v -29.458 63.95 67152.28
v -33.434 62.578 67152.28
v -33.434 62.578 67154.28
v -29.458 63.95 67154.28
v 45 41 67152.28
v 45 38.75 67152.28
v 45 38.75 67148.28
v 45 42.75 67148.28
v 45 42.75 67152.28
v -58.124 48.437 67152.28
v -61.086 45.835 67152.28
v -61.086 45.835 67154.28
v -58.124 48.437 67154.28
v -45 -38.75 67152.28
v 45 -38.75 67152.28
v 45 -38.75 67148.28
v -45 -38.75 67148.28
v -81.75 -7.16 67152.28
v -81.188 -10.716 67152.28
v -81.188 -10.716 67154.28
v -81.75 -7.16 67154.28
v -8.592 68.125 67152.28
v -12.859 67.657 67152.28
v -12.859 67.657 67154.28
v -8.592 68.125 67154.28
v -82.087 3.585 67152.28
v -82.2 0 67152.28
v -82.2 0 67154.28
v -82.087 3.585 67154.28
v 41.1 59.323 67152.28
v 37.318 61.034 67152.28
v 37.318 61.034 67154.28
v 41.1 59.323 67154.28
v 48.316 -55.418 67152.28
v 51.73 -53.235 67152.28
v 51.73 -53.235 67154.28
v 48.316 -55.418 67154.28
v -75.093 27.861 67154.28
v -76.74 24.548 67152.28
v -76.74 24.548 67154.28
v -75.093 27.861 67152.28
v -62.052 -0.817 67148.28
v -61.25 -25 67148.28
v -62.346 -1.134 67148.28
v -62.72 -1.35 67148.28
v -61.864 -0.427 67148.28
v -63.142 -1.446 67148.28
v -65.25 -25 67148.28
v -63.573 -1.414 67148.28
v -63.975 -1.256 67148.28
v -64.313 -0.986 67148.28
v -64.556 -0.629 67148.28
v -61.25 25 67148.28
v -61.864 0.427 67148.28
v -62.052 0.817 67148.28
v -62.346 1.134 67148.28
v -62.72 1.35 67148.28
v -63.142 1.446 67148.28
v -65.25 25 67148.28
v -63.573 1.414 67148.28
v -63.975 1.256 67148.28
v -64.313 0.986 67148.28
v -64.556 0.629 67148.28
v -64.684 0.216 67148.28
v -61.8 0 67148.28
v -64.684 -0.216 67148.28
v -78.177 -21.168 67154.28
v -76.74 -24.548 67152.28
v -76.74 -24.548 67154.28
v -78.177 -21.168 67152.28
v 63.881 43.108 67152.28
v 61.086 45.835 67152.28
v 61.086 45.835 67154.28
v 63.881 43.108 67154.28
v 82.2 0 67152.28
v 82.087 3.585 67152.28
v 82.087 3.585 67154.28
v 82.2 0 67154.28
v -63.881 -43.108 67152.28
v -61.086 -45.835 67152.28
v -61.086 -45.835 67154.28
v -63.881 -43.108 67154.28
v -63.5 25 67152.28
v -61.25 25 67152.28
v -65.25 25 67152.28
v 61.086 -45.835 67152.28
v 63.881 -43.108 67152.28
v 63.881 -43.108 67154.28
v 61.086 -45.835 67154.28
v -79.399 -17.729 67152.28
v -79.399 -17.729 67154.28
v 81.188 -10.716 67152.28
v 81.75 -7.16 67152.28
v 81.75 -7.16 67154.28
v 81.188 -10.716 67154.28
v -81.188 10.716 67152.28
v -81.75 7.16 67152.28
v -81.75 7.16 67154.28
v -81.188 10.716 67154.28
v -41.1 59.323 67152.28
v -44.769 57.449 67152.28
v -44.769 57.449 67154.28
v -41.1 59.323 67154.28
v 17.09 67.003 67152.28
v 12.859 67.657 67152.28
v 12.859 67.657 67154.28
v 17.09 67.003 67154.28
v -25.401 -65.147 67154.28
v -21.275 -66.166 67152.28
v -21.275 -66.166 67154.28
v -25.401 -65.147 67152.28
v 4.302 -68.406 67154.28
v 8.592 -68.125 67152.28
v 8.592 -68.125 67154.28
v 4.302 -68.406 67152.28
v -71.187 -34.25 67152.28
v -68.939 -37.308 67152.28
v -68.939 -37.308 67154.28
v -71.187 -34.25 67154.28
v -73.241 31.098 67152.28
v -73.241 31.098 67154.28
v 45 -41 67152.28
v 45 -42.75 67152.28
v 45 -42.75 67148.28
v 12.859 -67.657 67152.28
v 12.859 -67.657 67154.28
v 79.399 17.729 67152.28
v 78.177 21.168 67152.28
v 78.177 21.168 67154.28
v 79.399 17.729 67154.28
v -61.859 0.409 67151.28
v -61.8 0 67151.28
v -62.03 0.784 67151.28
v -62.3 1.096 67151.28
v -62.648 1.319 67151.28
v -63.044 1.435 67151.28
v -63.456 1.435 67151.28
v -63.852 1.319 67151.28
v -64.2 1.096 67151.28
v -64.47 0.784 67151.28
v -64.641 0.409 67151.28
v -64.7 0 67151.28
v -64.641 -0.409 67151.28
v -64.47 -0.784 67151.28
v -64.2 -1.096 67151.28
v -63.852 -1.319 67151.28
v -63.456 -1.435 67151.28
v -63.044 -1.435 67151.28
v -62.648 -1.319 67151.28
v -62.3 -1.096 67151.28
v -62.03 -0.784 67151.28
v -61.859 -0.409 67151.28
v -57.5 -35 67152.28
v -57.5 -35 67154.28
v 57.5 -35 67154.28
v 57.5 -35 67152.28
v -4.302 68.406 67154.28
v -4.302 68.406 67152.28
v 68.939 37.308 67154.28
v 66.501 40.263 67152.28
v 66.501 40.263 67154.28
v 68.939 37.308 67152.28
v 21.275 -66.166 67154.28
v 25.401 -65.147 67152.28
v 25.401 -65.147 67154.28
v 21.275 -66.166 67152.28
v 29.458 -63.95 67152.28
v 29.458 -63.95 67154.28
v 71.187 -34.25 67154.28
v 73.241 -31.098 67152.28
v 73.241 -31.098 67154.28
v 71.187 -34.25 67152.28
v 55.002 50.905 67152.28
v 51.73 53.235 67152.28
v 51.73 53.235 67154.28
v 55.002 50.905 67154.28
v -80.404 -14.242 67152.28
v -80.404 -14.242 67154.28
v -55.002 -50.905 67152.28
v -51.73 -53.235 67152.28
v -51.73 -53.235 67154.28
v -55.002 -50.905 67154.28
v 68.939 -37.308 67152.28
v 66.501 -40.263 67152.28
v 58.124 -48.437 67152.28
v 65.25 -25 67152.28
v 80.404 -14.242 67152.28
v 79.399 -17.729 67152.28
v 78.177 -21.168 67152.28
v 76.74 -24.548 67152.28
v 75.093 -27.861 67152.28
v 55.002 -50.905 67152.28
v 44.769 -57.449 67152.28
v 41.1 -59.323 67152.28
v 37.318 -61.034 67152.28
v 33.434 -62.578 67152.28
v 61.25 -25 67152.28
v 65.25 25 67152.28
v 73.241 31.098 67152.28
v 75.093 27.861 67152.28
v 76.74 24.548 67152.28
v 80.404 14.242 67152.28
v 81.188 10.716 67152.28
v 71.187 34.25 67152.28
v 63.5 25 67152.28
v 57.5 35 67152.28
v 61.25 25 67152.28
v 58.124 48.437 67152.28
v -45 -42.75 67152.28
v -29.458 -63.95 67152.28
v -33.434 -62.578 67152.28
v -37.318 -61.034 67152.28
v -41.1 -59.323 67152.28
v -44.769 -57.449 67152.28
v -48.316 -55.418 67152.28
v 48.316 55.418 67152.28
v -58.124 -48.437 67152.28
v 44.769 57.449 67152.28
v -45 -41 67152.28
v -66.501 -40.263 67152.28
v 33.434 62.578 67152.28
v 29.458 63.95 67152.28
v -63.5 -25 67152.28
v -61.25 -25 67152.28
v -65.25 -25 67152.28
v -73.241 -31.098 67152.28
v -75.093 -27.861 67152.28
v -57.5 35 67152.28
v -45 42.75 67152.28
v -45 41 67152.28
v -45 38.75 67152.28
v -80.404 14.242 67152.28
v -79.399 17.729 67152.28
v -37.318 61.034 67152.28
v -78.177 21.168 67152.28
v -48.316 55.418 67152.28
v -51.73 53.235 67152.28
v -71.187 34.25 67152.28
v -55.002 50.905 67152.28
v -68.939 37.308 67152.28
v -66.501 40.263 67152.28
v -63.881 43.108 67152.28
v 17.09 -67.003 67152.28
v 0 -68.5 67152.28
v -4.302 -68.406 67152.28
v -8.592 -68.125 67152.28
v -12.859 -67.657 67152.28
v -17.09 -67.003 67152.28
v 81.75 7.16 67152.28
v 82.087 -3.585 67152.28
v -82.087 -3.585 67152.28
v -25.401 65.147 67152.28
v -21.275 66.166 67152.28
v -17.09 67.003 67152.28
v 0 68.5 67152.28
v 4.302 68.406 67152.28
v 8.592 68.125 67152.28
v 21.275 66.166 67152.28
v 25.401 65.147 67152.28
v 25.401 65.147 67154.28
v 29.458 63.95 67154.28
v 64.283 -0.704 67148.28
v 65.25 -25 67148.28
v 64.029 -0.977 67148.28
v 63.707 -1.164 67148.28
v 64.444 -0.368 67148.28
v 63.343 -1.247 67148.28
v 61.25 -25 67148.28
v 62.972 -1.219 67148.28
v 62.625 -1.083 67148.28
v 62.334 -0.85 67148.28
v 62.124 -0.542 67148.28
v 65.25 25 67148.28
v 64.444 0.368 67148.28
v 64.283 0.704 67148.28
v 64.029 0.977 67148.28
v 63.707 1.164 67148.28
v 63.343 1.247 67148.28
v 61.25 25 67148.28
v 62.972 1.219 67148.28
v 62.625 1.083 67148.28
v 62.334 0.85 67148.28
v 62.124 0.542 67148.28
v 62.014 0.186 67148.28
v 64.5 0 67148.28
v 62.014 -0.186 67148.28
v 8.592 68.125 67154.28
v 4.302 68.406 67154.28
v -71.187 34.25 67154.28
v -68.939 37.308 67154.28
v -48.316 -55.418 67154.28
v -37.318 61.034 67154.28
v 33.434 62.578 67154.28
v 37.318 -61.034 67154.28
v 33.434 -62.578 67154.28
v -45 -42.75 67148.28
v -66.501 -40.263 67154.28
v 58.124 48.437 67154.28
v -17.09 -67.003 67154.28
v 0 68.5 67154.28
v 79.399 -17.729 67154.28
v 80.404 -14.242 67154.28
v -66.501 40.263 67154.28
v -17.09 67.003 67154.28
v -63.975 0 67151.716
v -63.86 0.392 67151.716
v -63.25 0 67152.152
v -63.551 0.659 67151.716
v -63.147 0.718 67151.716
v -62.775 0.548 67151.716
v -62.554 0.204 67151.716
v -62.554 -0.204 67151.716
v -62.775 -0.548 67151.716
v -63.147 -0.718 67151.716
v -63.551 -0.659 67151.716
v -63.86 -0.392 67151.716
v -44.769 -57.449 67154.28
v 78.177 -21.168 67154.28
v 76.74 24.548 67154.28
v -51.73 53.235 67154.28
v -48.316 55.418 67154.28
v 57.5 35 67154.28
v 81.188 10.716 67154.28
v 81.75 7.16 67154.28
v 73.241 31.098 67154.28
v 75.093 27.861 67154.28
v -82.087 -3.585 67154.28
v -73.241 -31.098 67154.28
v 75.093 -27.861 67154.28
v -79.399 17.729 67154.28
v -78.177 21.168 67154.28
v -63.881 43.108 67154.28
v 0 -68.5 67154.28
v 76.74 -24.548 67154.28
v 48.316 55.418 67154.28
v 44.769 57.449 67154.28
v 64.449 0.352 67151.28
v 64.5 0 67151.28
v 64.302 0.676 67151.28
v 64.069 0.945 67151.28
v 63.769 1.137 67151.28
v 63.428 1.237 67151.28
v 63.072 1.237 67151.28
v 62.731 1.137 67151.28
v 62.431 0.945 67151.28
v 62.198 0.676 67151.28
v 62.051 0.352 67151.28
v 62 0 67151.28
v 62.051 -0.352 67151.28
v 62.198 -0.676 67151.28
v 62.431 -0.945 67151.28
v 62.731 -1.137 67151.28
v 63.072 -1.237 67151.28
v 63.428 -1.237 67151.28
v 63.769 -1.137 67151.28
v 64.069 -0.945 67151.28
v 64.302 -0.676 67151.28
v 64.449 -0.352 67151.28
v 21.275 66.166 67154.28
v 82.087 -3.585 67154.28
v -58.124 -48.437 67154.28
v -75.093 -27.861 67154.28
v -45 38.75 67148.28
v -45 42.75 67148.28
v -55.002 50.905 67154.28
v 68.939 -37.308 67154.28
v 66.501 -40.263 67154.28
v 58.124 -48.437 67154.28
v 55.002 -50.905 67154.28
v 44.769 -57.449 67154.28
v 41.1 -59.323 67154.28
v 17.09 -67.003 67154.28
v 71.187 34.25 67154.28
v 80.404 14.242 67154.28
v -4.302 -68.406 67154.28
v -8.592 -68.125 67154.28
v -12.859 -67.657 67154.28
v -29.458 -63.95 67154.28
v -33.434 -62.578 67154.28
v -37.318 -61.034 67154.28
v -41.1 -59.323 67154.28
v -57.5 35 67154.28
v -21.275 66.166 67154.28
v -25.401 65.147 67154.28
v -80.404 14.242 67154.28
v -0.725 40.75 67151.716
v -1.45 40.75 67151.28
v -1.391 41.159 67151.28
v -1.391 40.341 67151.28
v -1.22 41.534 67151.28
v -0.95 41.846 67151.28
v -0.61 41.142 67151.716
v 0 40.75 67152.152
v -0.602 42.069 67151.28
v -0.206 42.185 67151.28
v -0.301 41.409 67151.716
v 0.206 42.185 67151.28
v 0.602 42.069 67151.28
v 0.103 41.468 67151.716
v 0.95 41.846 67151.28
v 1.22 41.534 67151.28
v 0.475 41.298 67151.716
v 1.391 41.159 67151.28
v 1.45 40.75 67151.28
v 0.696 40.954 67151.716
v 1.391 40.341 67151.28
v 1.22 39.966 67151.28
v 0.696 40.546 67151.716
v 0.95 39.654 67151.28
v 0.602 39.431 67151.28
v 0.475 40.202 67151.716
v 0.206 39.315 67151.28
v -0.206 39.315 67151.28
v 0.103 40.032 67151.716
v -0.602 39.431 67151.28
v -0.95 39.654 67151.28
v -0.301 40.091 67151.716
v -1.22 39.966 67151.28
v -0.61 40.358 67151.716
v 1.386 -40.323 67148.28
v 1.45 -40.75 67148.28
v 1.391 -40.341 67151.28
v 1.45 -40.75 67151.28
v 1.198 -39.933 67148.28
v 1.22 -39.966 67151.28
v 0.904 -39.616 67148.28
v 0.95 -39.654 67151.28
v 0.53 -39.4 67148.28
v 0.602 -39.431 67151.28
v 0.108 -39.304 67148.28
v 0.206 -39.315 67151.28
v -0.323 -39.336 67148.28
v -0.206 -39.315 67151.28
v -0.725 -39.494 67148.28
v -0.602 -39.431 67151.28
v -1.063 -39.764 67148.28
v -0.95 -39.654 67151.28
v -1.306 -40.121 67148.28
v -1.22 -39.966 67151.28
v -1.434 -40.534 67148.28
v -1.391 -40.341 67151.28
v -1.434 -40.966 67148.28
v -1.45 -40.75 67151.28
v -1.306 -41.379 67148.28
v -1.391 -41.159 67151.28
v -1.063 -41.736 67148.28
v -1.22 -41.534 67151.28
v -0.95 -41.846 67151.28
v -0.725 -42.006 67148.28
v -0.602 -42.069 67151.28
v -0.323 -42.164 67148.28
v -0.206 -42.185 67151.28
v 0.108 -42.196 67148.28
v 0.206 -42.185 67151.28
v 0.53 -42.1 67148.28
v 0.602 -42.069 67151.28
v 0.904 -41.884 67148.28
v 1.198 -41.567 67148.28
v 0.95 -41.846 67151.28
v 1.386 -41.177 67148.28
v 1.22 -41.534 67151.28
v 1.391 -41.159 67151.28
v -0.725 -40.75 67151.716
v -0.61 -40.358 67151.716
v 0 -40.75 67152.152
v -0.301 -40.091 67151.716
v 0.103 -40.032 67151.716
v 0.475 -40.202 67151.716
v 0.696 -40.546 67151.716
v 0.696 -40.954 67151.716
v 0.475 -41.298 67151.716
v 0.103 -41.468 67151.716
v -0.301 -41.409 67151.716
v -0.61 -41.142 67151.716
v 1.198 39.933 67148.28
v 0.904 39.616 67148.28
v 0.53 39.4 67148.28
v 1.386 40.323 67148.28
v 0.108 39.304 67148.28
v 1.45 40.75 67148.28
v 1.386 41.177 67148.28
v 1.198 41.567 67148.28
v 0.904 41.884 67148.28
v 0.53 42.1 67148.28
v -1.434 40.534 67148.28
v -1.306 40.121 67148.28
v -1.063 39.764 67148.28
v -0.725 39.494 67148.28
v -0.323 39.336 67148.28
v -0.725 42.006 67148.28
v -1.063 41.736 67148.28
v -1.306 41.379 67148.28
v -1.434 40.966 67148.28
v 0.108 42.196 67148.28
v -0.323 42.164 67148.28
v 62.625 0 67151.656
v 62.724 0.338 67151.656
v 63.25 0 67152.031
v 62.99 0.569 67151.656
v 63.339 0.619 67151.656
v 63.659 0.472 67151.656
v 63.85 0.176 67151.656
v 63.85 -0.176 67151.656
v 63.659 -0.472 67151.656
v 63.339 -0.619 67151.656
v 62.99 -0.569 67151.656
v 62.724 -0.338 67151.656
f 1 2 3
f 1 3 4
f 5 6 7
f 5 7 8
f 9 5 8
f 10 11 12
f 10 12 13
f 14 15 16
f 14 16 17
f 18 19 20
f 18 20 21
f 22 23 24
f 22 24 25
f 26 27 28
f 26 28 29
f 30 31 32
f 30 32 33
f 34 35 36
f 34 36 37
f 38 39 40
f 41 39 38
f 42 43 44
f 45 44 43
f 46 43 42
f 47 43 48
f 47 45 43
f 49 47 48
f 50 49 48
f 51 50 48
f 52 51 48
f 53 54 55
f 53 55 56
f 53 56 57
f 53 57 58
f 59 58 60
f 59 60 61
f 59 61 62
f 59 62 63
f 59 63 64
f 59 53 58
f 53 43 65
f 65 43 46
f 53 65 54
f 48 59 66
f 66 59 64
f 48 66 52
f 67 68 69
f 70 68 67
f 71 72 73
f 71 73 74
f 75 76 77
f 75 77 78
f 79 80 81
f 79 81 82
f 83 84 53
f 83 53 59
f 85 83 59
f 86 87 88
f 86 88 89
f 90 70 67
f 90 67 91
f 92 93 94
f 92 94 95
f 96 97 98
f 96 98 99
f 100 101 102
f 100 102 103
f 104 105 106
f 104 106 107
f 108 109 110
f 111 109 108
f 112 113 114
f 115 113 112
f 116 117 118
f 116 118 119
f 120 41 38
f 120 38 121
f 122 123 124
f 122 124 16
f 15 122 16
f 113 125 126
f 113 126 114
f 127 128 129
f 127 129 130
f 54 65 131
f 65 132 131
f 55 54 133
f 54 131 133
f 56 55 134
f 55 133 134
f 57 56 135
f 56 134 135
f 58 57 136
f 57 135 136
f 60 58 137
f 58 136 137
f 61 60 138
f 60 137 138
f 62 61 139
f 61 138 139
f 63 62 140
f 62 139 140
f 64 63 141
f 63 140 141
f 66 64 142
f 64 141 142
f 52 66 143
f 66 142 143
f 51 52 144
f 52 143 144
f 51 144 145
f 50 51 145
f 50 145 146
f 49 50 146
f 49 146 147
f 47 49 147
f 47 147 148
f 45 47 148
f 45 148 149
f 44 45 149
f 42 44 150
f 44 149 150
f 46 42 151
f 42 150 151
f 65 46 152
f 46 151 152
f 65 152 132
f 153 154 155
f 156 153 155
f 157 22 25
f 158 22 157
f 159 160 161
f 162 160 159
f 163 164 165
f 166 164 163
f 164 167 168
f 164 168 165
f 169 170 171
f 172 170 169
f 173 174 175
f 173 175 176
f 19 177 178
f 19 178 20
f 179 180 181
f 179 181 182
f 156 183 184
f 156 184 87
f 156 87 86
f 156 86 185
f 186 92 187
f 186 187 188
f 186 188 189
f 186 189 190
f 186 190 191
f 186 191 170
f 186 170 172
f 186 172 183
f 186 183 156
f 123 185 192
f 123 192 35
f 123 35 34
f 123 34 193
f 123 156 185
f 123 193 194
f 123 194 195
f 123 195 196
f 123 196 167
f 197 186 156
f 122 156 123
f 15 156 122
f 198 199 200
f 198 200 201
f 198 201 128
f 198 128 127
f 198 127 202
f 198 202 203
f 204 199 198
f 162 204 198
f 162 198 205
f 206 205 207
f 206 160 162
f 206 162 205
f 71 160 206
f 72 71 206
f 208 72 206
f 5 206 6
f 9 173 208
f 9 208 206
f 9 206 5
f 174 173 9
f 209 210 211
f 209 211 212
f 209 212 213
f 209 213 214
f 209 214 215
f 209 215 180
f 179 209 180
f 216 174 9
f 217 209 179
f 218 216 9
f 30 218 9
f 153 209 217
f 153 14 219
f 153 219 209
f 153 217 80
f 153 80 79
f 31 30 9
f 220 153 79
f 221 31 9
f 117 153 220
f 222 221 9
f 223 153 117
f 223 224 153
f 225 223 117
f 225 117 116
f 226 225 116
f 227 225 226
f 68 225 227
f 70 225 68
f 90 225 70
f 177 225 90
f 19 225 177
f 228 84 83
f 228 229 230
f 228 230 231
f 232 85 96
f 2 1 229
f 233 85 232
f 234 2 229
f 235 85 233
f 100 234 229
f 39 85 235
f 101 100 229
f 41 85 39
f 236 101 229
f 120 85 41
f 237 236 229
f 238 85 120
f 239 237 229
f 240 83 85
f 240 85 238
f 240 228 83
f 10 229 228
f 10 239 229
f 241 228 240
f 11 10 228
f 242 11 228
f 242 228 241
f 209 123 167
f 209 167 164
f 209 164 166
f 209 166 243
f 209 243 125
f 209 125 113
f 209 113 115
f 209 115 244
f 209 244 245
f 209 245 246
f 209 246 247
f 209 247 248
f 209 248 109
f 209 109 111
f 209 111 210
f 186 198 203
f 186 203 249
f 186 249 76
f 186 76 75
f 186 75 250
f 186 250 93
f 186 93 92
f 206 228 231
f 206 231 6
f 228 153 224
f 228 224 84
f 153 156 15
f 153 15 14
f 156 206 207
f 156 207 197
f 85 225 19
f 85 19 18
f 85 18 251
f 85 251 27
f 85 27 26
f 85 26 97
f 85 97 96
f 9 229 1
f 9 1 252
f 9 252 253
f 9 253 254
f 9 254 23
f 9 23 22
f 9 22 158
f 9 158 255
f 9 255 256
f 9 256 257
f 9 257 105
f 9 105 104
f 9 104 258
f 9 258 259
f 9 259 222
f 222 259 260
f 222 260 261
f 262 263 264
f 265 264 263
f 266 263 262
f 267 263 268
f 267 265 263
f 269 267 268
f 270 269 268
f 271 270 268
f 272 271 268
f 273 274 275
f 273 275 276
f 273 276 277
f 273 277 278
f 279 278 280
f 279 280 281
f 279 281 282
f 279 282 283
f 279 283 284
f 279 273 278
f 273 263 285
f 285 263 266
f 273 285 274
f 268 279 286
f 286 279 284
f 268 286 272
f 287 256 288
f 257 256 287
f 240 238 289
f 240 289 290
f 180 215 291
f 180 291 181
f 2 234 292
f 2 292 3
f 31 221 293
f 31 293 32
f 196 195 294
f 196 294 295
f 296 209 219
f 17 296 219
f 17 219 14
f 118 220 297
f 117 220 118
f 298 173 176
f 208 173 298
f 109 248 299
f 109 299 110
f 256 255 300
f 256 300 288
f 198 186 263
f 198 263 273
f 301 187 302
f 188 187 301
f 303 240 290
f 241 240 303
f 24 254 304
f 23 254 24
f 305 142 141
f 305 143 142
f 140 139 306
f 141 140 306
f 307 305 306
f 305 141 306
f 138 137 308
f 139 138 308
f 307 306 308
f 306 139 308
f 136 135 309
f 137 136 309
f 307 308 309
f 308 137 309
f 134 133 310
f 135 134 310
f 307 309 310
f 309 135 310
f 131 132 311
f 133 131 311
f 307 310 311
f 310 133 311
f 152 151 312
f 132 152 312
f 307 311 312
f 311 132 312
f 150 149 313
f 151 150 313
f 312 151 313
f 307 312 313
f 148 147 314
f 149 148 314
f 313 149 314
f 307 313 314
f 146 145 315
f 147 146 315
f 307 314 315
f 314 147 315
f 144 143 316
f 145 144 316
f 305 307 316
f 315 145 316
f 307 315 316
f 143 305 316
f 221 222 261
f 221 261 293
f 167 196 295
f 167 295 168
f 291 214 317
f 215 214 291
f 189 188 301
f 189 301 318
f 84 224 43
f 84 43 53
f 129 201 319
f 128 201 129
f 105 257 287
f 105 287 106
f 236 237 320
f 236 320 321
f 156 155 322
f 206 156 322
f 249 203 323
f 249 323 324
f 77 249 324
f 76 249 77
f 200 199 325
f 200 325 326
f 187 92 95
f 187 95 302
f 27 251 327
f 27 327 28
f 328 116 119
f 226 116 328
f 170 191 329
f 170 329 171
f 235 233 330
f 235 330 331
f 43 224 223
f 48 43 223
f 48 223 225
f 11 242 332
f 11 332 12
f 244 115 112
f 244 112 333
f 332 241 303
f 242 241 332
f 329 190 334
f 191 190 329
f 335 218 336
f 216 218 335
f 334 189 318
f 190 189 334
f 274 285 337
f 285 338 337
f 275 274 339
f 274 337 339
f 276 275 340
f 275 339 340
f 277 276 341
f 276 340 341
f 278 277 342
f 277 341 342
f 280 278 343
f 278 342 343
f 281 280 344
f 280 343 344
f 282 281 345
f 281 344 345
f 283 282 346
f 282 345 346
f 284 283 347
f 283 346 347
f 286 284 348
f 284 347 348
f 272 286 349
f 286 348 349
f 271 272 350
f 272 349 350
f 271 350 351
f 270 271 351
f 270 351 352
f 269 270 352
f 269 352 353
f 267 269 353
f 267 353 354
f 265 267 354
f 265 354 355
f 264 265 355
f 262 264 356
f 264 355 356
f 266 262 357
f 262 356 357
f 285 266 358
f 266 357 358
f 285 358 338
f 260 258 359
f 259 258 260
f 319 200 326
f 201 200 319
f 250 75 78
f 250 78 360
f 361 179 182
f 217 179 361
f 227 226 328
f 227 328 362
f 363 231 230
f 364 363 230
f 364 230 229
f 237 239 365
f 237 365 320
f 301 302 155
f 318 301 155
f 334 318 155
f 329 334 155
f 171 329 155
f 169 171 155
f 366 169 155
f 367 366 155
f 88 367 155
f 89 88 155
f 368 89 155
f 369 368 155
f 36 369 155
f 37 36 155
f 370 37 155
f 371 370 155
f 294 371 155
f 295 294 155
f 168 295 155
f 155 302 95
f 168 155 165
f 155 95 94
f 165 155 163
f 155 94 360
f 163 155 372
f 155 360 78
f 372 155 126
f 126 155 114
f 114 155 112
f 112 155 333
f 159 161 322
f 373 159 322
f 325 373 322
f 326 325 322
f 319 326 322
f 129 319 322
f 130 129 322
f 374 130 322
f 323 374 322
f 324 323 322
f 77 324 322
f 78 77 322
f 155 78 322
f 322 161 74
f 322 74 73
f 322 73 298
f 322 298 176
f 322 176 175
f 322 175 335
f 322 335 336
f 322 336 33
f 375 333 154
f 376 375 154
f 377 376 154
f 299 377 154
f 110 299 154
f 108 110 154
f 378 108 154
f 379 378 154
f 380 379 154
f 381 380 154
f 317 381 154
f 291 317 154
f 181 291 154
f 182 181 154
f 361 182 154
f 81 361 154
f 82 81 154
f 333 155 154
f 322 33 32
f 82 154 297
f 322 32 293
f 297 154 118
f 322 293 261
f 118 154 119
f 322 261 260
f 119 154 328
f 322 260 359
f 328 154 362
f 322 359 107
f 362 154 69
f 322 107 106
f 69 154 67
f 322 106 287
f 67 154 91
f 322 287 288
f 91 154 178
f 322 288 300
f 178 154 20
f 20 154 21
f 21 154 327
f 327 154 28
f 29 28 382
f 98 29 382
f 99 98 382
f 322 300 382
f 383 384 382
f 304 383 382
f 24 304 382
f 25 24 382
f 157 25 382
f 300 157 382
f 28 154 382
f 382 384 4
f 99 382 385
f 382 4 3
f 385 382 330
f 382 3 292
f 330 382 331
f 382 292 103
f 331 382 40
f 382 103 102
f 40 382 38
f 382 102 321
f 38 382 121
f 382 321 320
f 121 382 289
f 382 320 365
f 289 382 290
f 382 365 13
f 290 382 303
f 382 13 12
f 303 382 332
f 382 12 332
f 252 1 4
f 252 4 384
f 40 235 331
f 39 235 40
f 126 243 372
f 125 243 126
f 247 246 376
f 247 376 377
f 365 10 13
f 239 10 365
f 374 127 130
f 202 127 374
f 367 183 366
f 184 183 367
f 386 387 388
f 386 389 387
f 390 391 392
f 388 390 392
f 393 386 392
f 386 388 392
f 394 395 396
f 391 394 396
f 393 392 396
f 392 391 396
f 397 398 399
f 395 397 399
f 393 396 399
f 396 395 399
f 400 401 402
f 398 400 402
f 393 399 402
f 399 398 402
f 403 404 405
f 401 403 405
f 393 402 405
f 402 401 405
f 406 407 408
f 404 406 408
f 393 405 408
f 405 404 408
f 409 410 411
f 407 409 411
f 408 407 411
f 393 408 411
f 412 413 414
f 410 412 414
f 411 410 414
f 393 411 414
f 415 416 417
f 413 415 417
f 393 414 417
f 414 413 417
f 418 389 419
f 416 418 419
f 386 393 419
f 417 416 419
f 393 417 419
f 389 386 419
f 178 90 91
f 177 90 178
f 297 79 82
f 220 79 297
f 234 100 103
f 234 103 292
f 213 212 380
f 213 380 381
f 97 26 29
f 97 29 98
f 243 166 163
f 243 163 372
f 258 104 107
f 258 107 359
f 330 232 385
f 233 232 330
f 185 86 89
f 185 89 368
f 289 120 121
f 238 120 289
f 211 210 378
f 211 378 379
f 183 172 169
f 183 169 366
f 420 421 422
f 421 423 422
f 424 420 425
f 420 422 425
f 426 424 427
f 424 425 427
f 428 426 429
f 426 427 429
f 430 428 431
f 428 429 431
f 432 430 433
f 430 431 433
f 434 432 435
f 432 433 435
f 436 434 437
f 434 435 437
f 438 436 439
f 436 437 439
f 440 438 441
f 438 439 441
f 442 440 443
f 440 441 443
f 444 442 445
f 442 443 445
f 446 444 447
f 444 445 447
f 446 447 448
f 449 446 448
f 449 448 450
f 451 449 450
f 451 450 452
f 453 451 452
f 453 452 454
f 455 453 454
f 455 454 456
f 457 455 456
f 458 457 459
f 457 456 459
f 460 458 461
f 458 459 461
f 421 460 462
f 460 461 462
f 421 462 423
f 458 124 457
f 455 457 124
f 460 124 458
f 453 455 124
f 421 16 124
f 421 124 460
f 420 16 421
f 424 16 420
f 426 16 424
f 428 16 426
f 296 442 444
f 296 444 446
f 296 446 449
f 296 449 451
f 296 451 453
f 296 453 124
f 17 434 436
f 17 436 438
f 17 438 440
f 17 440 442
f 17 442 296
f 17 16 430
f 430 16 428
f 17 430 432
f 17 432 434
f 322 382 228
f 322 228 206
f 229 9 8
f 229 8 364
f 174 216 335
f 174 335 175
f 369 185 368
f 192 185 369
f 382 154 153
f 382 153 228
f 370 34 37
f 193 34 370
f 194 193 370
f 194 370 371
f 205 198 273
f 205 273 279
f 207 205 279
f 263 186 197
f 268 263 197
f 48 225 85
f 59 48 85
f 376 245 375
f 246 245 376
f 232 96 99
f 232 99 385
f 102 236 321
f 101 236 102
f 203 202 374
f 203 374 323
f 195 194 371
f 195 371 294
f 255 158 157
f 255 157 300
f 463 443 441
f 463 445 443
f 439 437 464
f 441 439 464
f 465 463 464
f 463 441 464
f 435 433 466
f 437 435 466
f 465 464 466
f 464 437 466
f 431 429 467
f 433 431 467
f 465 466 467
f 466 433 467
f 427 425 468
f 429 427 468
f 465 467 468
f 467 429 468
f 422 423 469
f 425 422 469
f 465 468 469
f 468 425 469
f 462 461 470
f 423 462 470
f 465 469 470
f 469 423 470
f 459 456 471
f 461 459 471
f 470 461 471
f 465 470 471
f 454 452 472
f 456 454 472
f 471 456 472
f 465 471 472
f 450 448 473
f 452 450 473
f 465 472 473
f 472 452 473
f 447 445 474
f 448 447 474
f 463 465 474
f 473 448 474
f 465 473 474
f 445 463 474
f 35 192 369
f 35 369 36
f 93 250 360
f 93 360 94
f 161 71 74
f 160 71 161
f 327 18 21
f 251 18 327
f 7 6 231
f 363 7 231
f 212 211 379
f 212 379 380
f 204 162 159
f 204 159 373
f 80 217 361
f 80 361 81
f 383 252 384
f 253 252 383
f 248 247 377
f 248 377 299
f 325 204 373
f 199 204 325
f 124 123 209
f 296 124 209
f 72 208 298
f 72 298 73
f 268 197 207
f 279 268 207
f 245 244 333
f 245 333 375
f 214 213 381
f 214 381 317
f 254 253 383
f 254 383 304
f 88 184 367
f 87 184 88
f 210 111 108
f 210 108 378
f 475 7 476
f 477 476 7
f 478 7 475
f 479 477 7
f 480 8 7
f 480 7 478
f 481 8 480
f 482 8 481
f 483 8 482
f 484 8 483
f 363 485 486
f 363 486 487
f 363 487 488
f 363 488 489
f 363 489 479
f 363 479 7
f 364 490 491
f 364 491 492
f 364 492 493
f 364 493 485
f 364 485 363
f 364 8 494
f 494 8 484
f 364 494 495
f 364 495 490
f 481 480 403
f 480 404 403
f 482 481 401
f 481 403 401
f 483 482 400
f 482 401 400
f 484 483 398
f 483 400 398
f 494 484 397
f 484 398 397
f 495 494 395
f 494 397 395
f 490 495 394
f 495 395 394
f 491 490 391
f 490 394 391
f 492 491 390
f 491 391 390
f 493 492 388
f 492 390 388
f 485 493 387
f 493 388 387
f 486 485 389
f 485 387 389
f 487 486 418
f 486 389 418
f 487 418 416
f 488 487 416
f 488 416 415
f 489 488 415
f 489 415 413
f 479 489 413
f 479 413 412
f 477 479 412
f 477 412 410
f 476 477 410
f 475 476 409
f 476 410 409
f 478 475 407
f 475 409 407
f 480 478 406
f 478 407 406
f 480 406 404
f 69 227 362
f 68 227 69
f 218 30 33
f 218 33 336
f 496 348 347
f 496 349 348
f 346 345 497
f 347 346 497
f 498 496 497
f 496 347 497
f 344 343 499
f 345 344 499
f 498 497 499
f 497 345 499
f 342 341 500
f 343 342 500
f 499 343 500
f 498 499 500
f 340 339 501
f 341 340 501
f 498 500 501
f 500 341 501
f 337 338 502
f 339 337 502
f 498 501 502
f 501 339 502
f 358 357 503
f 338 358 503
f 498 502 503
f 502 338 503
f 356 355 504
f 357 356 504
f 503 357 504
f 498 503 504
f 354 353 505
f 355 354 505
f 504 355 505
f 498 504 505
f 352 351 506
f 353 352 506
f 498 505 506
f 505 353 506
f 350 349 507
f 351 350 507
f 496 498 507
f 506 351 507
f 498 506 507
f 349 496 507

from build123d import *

# Parameters (mm, degrees)
BOSS_EXTRUDE1_DEPTH             = 2000
SKETCH2_W                       = 115000
SKETCH2_H                       = 70000
CUT_EXTRUDE1_DEPTH              = 2001
SKETCH3_W                       = 2250
SKETCH3_H                       = 50000
BOSS_EXTRUDE2_DEPTH             = 4000
SKETCH4_W                       = 90000
SKETCH4_H                       = 2250
BOSS_EXTRUDE3_DEPTH             = 4000
SKETCH5_W                       = 90000
SKETCH5_H                       = 2250
BOSS_EXTRUDE4_DEPTH             = 4000
SKETCH6_W                       = 2250
SKETCH6_H                       = 50000
BOSS_EXTRUDE5_DEPTH             = 4000
SCALE4_SCALE                    = 0.001
SKETCH17_W                      = 4
SKETCH17_H                      = 50
BOSS_EXTRUDE7_DEPTH             = 4
F_40_0_098_DIAMETER_HOLE1_D     = 2.50000008
F_40_0_098_DIAMETER_HOLE1_DEPTH = 3
F_40_0_098_DIAMETER_HOLE1_TIP   = 0.751075798
SKETCH21_W                      = 90
SKETCH21_H                      = 4
BOSS_EXTRUDE8_DEPTH             = 4
SKETCH22_W                      = 4
SKETCH22_H                      = 50
BOSS_EXTRUDE9_DEPTH             = 4
SKETCH23_W                      = 90
SKETCH23_H                      = 4
BOSS_EXTRUDE10_DEPTH            = 4
M2_5_CLEARANCE_HOLE3_D          = 2.9
M2_5_CLEARANCE_HOLE3_DEPTH      = 3
M2_5_CLEARANCE_HOLE3_TIP        = 0.871247898
M2_5_CLEARANCE_HOLE4_D          = 2.9
M2_5_CLEARANCE_HOLE4_DEPTH      = 3
M2_5_CLEARANCE_HOLE4_TIP        = 0.871247898
M2_5_CLEARANCE_HOLE5_D          = 2.9
M2_5_CLEARANCE_HOLE5_DEPTH      = 3
M2_5_CLEARANCE_HOLE5_TIP        = 0.871247898


with BuildPart() as part:
    # Sketch1 → Boss-Extrude1 (new body)
    with BuildSketch(Plane(origin=(0, 0, 66500), x_dir=(-1, 0, 0), z_dir=(0, 0, -1))):
        Polygon((41099.998474121, 59322.700500488), (37318.000793457, 61033.9012146), (33433.799743652, 62577.899932861), (29457.799911499, 63950.298309326), (25401.19934082, 65147.399902344), (21274.900436401, 66165.901184082), (17090.299606323, 67003.09753418), (12858.90007019, 67656.600952148), (8592.240333557, 68124.702453613), (4302.020072937, 68406.097412109), (0, 68500), (-4302.020072937, 68406.097412109), (-8592.240333557, 68124.702453613), (-12858.90007019, 67656.600952148), (-17090.299606323, 67003.09753418), (-21274.900436401, 66165.901184082), (-25401.19934082, 65147.399902344), (-29457.799911499, 63950.298309326), (-33433.799743652, 62577.899932861), (-37318.000793457, 61033.9012146), (-41099.998474121, 59322.700500488), (-44769.298553467, 57448.89831543), (-48315.898895264, 55417.701721191), (-51730.098724365, 53234.50088501), (-55002.498626709, 50905.39932251), (-58124.198913574, 48436.798095703), (-61086.498260498, 45835.399627686), (-63881.401062012, 43108.3984375), (-66501.197814941, 40263.301849365), (-68938.697814941, 37307.800292969), (-71187.301635742, 34250), (-73240.699768066, 31098.300933838), (-75093.399047852, 27861.499786377), (-76740.303039551, 24548.2006073), (-78176.803588867, 21167.699813843), (-79399.101257324, 17729.099273682), (-80403.701782227, 14241.99962616), (-81188.003540039, 10715.800285339), (-81749.702453613, 7160.200119019), (-82087.303161621, 3585.010051727), (-82199.996948242, 0), (-82087.303161621, -3585.010051727), (-81749.702453613, -7160.200119019), (-81188.003540039, -10715.800285339), (-80403.701782227, -14241.99962616), (-79399.101257324, -17729.099273682), (-78176.803588867, -21167.699813843), (-76740.303039551, -24548.2006073), (-75093.399047852, -27861.499786377), (-73240.699768066, -31098.300933838), (-71187.301635742, -34250), (-68938.697814941, -37307.800292969), (-66501.197814941, -40263.301849365), (-63881.401062012, -43108.3984375), (-61086.498260498, -45835.399627686), (-58124.198913574, -48436.798095703), (-55002.498626709, -50905.39932251), (-51730.098724365, -53234.50088501), (-48315.898895264, -55417.701721191), (-44769.298553467, -57448.89831543), (-41099.998474121, -59322.700500488), (-37318.000793457, -61033.9012146), (-33433.799743652, -62577.899932861), (-29457.799911499, -63950.298309326), (-25401.19934082, -65147.399902344), (-21274.900436401, -66165.901184082), (-17090.299606323, -67003.09753418), (-12858.90007019, -67656.600952148), (-8592.240333557, -68124.702453613), (-4302.020072937, -68406.097412109), (0, -68500), (4302.020072937, -68406.097412109), (8592.240333557, -68124.702453613), (12858.90007019, -67656.600952148), (17090.299606323, -67003.09753418), (21274.900436401, -66165.901184082), (25401.19934082, -65147.399902344), (29457.799911499, -63950.298309326), (33433.799743652, -62577.899932861), (37318.000793457, -61033.9012146), (41099.998474121, -59322.700500488), (44769.298553467, -57448.89831543), (48315.898895264, -55417.701721191), (51730.098724365, -53234.50088501), (55002.498626709, -50905.39932251), (58124.198913574, -48436.798095703), (61086.498260498, -45835.399627686), (63881.401062012, -43108.3984375), (66501.197814941, -40263.301849365), (68938.697814941, -37307.800292969), (71187.301635742, -34250), (73240.699768066, -31098.300933838), (75093.399047852, -27861.499786377), (76740.303039551, -24548.2006073), (78176.803588867, -21167.699813843), (79399.101257324, -17729.099273682), (80403.701782227, -14241.99962616), (81188.003540039, -10715.800285339), (81749.702453613, -7160.200119019), (82087.303161621, -3585.010051727), (82199.996948242, 0), (82087.303161621, 3585.010051727), (81749.702453613, 7160.200119019), (81188.003540039, 10715.800285339), (80403.701782227, 14241.99962616), (79399.101257324, 17729.099273682), (78176.803588867, 21167.699813843), (76740.303039551, 24548.2006073), (75093.399047852, 27861.499786377), (73240.699768066, 31098.300933838), (71187.301635742, 34250), (68938.697814941, 37307.800292969), (66501.197814941, 40263.301849365), (63881.401062012, 43108.3984375), (61086.498260498, 45835.399627686), (58124.198913574, 48436.798095703), (55002.498626709, 50905.39932251), (51730.098724365, 53234.50088501), (48315.898895264, 55417.701721191), (44769.298553467, 57448.89831543), align=None)
    extrude(amount=-BOSS_EXTRUDE1_DEPTH)

    # Sketch2 → Cut-Extrude1 (cut, through all)
    with BuildSketch(Plane.XY.offset(68500)):
        Rectangle(SKETCH2_W, SKETCH2_H)
    extrude(amount=-CUT_EXTRUDE1_DEPTH, mode=Mode.SUBTRACT)

    # Sketch3 → Boss-Extrude2 (add)
    with BuildSketch(Plane(origin=(0, 0, 66500), x_dir=(-1, 0, 0), z_dir=(0, 0, -1))):
        with Locations((62375, 0)):
            Rectangle(SKETCH3_W, SKETCH3_H)
    extrude(amount=BOSS_EXTRUDE2_DEPTH)

    # Sketch4 → Boss-Extrude3 (add)
    with BuildSketch(Plane(origin=(0, 0, 66500), x_dir=(-1, 0, 0), z_dir=(0, 0, -1))):
        with Locations((0, 39875)):
            Rectangle(SKETCH4_W, SKETCH4_H)
    extrude(amount=BOSS_EXTRUDE3_DEPTH)

    # Sketch5 → Boss-Extrude4 (add)
    with BuildSketch(Plane(origin=(0, 0, 66500), x_dir=(-1, 0, 0), z_dir=(0, 0, -1))):
        with Locations((0, -39875)):
            Rectangle(SKETCH5_W, SKETCH5_H)
    extrude(amount=BOSS_EXTRUDE4_DEPTH)

    # Sketch6 → Boss-Extrude5 (add)
    with BuildSketch(Plane(origin=(0, 0, 66500), x_dir=(-1, 0, 0), z_dir=(0, 0, -1))):
        with Locations((-62375, 0)):
            Rectangle(SKETCH6_W, SKETCH6_H)
    extrude(amount=BOSS_EXTRUDE5_DEPTH)


with BuildPart() as part_1:
    # Scale4: scaled about (0, 0, 67152.933263132)
    add(part.part.scale(SCALE4_SCALE).moved(Location((0, 0, 67085.780329869))))

    # Sketch17 → Boss-Extrude7 (add)
    with BuildSketch(Plane(origin=(0, 0, 67152.280329869), x_dir=(-1, 0, 0), z_dir=(0, 0, -1))):
        with Locations((-63.25, 0)):
            Rectangle(SKETCH17_W, SKETCH17_H)
    extrude(amount=BOSS_EXTRUDE7_DEPTH)

    # #40 (0.098) Diameter Hole1
    with Locations(Plane(origin=(0, 0, 67148.280329869), x_dir=(-1, 0, 0), z_dir=(0, 0, -1))):
        with Locations((-63.25, 0)):
            Hole(F_40_0_098_DIAMETER_HOLE1_D / 2, depth=F_40_0_098_DIAMETER_HOLE1_DEPTH)
            with Locations((0, 0, -(F_40_0_098_DIAMETER_HOLE1_DEPTH + F_40_0_098_DIAMETER_HOLE1_TIP / 2))):  # 118° drill point
                Cone(0, F_40_0_098_DIAMETER_HOLE1_D / 2, F_40_0_098_DIAMETER_HOLE1_TIP, mode=Mode.SUBTRACT)

    # Sketch21 → Boss-Extrude8 (add)
    with BuildSketch(Plane(origin=(0, 0, 67152.280329869), x_dir=(-1, 0, 0), z_dir=(0, 0, -1))):
        with Locations((0, 40.75)):
            Rectangle(SKETCH21_W, SKETCH21_H)
    extrude(amount=BOSS_EXTRUDE8_DEPTH)

    # Sketch22 → Boss-Extrude9 (add)
    with BuildSketch(Plane(origin=(0, 0, 67152.280329869), x_dir=(-1, 0, 0), z_dir=(0, 0, -1))):
        with Locations((63.25, 0)):
            Rectangle(SKETCH22_W, SKETCH22_H)
    extrude(amount=BOSS_EXTRUDE9_DEPTH)

    # Sketch23 → Boss-Extrude10 (add)
    with BuildSketch(Plane(origin=(0, 0, 67152.280329869), x_dir=(-1, 0, 0), z_dir=(0, 0, -1))):
        with Locations((0, -40.75)):
            Rectangle(SKETCH23_W, SKETCH23_H)
    extrude(amount=BOSS_EXTRUDE10_DEPTH)

    # M2.5 Clearance Hole3
    with Locations(Plane(origin=(0, 0, 67148.280329869), x_dir=(-1, 0, 0), z_dir=(0, 0, -1))):
        with Locations((0, -40.75)):
            Hole(M2_5_CLEARANCE_HOLE3_D / 2, depth=M2_5_CLEARANCE_HOLE3_DEPTH)
            with Locations((0, 0, -(M2_5_CLEARANCE_HOLE3_DEPTH + M2_5_CLEARANCE_HOLE3_TIP / 2))):  # 118° drill point
                Cone(0, M2_5_CLEARANCE_HOLE3_D / 2, M2_5_CLEARANCE_HOLE3_TIP, mode=Mode.SUBTRACT)

    # M2.5 Clearance Hole4
    with Locations(Plane(origin=(0, 0, 67148.280329869), x_dir=(-1, 0, 0), z_dir=(0, 0, -1))):
        with Locations((0, 40.75)):
            Hole(M2_5_CLEARANCE_HOLE4_D / 2, depth=M2_5_CLEARANCE_HOLE4_DEPTH)
            with Locations((0, 0, -(M2_5_CLEARANCE_HOLE4_DEPTH + M2_5_CLEARANCE_HOLE4_TIP / 2))):  # 118° drill point
                Cone(0, M2_5_CLEARANCE_HOLE4_D / 2, M2_5_CLEARANCE_HOLE4_TIP, mode=Mode.SUBTRACT)

    # M2.5 Clearance Hole5
    with Locations(Plane(origin=(0, 0, 67148.280329869), x_dir=(-1, 0, 0), z_dir=(0, 0, -1))):
        with Locations((63.25, 0)):
            Hole(M2_5_CLEARANCE_HOLE5_D / 2, depth=M2_5_CLEARANCE_HOLE5_DEPTH)
            with Locations((0, 0, -(M2_5_CLEARANCE_HOLE5_DEPTH + M2_5_CLEARANCE_HOLE5_TIP / 2))):  # 118° drill point
                Cone(0, M2_5_CLEARANCE_HOLE5_D / 2, M2_5_CLEARANCE_HOLE5_TIP, mode=Mode.SUBTRACT)


solid = part_1.part
